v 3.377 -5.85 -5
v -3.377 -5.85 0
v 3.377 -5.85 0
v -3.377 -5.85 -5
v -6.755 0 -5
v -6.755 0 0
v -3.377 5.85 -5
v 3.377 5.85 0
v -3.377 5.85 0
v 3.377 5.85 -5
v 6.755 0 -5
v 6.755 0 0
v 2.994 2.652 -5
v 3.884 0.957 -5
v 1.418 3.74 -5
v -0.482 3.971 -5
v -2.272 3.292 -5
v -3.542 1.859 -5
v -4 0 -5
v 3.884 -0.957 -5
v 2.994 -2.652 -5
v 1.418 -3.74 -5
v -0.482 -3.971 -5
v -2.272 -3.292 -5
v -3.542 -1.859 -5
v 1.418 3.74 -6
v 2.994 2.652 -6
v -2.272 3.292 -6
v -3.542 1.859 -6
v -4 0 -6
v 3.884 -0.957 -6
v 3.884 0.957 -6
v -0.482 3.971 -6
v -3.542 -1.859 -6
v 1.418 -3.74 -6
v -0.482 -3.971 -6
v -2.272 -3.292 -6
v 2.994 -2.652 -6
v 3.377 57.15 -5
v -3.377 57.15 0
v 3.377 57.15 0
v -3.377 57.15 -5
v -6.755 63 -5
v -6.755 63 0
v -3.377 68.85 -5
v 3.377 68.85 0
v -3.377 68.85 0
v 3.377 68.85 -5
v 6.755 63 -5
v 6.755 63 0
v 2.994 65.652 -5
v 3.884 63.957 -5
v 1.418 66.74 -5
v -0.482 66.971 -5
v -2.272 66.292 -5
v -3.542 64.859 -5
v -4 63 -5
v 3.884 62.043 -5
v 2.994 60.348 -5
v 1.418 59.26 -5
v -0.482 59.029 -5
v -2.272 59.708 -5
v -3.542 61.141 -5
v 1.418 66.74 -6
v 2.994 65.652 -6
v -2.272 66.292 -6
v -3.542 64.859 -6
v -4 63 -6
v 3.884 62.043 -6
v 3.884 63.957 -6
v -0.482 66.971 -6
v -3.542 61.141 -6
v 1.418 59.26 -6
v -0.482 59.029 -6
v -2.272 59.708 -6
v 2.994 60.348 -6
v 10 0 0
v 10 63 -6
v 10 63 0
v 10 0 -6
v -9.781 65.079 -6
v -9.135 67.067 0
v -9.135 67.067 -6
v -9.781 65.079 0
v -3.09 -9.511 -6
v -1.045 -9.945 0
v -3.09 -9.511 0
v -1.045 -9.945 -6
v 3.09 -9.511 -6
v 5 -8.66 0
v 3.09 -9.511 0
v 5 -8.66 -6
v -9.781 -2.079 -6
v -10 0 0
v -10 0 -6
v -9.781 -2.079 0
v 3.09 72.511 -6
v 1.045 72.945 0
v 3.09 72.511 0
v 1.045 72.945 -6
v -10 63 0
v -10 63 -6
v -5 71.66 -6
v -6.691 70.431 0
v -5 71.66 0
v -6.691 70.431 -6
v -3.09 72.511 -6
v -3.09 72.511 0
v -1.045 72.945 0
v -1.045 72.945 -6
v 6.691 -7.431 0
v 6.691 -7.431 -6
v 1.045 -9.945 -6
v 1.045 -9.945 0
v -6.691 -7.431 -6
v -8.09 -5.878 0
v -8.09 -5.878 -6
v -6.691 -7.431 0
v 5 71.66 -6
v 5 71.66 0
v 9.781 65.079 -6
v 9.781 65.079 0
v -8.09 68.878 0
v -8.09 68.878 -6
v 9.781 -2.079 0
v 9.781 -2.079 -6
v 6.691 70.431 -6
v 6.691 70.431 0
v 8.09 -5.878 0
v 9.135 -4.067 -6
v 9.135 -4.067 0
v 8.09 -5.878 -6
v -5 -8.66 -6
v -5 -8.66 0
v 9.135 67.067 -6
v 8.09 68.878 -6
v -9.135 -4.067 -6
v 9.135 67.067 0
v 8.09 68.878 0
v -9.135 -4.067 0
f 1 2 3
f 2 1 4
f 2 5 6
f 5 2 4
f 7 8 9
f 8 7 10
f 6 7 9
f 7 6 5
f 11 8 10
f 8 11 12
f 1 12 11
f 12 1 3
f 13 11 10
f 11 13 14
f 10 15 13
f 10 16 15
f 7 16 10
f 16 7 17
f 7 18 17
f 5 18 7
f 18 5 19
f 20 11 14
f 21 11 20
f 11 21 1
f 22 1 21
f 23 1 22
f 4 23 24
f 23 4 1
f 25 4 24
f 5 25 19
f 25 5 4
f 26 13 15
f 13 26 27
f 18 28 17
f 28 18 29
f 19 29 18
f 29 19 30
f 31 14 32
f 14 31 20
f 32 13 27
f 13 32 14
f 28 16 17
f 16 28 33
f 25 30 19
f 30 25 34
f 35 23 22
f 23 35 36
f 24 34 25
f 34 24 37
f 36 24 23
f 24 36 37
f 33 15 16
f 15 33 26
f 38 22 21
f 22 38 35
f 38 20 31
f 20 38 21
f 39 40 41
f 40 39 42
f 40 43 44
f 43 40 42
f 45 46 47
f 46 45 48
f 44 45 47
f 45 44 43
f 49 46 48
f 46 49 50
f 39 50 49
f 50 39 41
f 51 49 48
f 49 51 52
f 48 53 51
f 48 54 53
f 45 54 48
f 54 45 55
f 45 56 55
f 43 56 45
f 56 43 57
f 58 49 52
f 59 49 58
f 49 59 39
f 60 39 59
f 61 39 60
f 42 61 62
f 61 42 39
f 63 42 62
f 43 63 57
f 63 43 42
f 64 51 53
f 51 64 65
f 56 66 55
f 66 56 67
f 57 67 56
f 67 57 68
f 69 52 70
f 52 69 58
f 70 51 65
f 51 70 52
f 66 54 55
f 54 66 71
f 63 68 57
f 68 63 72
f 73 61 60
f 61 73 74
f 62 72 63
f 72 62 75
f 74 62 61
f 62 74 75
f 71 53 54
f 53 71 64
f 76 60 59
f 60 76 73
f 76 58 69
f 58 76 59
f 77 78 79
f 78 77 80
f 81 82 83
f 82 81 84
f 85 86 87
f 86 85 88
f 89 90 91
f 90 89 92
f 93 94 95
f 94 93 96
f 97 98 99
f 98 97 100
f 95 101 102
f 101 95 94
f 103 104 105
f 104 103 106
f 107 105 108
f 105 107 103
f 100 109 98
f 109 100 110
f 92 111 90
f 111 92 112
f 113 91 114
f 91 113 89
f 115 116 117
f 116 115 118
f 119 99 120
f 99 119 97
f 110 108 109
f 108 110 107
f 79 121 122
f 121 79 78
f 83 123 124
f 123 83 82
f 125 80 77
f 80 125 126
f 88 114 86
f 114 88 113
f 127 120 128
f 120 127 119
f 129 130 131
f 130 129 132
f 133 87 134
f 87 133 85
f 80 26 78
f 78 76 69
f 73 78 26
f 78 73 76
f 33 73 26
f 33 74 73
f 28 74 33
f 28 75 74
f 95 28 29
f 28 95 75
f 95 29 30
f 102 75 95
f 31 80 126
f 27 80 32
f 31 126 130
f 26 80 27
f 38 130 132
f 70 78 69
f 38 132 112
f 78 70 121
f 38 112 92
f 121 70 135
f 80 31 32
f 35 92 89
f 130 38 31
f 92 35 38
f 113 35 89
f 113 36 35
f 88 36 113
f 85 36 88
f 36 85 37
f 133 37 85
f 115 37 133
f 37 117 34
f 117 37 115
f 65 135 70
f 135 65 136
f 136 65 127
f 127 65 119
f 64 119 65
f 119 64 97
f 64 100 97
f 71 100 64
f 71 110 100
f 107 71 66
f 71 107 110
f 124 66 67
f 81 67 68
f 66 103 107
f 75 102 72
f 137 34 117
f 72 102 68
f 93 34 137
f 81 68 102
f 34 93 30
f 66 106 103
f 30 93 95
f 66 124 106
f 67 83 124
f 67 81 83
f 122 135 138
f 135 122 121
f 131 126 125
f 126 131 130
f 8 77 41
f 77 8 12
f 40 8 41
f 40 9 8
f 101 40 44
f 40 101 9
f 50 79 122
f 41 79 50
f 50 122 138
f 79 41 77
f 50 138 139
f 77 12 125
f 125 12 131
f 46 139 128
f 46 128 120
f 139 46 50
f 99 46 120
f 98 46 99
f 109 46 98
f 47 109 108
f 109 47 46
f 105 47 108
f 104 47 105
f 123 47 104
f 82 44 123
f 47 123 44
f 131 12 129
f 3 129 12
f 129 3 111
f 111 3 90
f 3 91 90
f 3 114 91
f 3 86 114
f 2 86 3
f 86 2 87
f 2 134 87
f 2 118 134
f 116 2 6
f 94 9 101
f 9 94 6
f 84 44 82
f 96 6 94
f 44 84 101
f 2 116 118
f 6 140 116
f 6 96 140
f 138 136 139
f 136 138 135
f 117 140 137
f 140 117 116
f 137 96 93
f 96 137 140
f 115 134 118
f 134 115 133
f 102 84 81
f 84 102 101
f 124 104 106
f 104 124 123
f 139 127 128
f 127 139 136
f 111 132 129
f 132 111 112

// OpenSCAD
module bolt(d) {
    cylinder(d=d/cos(180/6), h=6, center=false, $fn=6);
    cylinder(d=8, h=50, center=false);
}

rotate([0,180,0]) difference() {
    hull() {
        cylinder(d=20, h=6, center=false);
        translate([0,63,0]) cylinder(d=20, h=6, center=false);
    }
    translate([0,0,-1]) {
        bolt(11.7);
        translate([0,63,0]) bolt(11.7);
    }
}
